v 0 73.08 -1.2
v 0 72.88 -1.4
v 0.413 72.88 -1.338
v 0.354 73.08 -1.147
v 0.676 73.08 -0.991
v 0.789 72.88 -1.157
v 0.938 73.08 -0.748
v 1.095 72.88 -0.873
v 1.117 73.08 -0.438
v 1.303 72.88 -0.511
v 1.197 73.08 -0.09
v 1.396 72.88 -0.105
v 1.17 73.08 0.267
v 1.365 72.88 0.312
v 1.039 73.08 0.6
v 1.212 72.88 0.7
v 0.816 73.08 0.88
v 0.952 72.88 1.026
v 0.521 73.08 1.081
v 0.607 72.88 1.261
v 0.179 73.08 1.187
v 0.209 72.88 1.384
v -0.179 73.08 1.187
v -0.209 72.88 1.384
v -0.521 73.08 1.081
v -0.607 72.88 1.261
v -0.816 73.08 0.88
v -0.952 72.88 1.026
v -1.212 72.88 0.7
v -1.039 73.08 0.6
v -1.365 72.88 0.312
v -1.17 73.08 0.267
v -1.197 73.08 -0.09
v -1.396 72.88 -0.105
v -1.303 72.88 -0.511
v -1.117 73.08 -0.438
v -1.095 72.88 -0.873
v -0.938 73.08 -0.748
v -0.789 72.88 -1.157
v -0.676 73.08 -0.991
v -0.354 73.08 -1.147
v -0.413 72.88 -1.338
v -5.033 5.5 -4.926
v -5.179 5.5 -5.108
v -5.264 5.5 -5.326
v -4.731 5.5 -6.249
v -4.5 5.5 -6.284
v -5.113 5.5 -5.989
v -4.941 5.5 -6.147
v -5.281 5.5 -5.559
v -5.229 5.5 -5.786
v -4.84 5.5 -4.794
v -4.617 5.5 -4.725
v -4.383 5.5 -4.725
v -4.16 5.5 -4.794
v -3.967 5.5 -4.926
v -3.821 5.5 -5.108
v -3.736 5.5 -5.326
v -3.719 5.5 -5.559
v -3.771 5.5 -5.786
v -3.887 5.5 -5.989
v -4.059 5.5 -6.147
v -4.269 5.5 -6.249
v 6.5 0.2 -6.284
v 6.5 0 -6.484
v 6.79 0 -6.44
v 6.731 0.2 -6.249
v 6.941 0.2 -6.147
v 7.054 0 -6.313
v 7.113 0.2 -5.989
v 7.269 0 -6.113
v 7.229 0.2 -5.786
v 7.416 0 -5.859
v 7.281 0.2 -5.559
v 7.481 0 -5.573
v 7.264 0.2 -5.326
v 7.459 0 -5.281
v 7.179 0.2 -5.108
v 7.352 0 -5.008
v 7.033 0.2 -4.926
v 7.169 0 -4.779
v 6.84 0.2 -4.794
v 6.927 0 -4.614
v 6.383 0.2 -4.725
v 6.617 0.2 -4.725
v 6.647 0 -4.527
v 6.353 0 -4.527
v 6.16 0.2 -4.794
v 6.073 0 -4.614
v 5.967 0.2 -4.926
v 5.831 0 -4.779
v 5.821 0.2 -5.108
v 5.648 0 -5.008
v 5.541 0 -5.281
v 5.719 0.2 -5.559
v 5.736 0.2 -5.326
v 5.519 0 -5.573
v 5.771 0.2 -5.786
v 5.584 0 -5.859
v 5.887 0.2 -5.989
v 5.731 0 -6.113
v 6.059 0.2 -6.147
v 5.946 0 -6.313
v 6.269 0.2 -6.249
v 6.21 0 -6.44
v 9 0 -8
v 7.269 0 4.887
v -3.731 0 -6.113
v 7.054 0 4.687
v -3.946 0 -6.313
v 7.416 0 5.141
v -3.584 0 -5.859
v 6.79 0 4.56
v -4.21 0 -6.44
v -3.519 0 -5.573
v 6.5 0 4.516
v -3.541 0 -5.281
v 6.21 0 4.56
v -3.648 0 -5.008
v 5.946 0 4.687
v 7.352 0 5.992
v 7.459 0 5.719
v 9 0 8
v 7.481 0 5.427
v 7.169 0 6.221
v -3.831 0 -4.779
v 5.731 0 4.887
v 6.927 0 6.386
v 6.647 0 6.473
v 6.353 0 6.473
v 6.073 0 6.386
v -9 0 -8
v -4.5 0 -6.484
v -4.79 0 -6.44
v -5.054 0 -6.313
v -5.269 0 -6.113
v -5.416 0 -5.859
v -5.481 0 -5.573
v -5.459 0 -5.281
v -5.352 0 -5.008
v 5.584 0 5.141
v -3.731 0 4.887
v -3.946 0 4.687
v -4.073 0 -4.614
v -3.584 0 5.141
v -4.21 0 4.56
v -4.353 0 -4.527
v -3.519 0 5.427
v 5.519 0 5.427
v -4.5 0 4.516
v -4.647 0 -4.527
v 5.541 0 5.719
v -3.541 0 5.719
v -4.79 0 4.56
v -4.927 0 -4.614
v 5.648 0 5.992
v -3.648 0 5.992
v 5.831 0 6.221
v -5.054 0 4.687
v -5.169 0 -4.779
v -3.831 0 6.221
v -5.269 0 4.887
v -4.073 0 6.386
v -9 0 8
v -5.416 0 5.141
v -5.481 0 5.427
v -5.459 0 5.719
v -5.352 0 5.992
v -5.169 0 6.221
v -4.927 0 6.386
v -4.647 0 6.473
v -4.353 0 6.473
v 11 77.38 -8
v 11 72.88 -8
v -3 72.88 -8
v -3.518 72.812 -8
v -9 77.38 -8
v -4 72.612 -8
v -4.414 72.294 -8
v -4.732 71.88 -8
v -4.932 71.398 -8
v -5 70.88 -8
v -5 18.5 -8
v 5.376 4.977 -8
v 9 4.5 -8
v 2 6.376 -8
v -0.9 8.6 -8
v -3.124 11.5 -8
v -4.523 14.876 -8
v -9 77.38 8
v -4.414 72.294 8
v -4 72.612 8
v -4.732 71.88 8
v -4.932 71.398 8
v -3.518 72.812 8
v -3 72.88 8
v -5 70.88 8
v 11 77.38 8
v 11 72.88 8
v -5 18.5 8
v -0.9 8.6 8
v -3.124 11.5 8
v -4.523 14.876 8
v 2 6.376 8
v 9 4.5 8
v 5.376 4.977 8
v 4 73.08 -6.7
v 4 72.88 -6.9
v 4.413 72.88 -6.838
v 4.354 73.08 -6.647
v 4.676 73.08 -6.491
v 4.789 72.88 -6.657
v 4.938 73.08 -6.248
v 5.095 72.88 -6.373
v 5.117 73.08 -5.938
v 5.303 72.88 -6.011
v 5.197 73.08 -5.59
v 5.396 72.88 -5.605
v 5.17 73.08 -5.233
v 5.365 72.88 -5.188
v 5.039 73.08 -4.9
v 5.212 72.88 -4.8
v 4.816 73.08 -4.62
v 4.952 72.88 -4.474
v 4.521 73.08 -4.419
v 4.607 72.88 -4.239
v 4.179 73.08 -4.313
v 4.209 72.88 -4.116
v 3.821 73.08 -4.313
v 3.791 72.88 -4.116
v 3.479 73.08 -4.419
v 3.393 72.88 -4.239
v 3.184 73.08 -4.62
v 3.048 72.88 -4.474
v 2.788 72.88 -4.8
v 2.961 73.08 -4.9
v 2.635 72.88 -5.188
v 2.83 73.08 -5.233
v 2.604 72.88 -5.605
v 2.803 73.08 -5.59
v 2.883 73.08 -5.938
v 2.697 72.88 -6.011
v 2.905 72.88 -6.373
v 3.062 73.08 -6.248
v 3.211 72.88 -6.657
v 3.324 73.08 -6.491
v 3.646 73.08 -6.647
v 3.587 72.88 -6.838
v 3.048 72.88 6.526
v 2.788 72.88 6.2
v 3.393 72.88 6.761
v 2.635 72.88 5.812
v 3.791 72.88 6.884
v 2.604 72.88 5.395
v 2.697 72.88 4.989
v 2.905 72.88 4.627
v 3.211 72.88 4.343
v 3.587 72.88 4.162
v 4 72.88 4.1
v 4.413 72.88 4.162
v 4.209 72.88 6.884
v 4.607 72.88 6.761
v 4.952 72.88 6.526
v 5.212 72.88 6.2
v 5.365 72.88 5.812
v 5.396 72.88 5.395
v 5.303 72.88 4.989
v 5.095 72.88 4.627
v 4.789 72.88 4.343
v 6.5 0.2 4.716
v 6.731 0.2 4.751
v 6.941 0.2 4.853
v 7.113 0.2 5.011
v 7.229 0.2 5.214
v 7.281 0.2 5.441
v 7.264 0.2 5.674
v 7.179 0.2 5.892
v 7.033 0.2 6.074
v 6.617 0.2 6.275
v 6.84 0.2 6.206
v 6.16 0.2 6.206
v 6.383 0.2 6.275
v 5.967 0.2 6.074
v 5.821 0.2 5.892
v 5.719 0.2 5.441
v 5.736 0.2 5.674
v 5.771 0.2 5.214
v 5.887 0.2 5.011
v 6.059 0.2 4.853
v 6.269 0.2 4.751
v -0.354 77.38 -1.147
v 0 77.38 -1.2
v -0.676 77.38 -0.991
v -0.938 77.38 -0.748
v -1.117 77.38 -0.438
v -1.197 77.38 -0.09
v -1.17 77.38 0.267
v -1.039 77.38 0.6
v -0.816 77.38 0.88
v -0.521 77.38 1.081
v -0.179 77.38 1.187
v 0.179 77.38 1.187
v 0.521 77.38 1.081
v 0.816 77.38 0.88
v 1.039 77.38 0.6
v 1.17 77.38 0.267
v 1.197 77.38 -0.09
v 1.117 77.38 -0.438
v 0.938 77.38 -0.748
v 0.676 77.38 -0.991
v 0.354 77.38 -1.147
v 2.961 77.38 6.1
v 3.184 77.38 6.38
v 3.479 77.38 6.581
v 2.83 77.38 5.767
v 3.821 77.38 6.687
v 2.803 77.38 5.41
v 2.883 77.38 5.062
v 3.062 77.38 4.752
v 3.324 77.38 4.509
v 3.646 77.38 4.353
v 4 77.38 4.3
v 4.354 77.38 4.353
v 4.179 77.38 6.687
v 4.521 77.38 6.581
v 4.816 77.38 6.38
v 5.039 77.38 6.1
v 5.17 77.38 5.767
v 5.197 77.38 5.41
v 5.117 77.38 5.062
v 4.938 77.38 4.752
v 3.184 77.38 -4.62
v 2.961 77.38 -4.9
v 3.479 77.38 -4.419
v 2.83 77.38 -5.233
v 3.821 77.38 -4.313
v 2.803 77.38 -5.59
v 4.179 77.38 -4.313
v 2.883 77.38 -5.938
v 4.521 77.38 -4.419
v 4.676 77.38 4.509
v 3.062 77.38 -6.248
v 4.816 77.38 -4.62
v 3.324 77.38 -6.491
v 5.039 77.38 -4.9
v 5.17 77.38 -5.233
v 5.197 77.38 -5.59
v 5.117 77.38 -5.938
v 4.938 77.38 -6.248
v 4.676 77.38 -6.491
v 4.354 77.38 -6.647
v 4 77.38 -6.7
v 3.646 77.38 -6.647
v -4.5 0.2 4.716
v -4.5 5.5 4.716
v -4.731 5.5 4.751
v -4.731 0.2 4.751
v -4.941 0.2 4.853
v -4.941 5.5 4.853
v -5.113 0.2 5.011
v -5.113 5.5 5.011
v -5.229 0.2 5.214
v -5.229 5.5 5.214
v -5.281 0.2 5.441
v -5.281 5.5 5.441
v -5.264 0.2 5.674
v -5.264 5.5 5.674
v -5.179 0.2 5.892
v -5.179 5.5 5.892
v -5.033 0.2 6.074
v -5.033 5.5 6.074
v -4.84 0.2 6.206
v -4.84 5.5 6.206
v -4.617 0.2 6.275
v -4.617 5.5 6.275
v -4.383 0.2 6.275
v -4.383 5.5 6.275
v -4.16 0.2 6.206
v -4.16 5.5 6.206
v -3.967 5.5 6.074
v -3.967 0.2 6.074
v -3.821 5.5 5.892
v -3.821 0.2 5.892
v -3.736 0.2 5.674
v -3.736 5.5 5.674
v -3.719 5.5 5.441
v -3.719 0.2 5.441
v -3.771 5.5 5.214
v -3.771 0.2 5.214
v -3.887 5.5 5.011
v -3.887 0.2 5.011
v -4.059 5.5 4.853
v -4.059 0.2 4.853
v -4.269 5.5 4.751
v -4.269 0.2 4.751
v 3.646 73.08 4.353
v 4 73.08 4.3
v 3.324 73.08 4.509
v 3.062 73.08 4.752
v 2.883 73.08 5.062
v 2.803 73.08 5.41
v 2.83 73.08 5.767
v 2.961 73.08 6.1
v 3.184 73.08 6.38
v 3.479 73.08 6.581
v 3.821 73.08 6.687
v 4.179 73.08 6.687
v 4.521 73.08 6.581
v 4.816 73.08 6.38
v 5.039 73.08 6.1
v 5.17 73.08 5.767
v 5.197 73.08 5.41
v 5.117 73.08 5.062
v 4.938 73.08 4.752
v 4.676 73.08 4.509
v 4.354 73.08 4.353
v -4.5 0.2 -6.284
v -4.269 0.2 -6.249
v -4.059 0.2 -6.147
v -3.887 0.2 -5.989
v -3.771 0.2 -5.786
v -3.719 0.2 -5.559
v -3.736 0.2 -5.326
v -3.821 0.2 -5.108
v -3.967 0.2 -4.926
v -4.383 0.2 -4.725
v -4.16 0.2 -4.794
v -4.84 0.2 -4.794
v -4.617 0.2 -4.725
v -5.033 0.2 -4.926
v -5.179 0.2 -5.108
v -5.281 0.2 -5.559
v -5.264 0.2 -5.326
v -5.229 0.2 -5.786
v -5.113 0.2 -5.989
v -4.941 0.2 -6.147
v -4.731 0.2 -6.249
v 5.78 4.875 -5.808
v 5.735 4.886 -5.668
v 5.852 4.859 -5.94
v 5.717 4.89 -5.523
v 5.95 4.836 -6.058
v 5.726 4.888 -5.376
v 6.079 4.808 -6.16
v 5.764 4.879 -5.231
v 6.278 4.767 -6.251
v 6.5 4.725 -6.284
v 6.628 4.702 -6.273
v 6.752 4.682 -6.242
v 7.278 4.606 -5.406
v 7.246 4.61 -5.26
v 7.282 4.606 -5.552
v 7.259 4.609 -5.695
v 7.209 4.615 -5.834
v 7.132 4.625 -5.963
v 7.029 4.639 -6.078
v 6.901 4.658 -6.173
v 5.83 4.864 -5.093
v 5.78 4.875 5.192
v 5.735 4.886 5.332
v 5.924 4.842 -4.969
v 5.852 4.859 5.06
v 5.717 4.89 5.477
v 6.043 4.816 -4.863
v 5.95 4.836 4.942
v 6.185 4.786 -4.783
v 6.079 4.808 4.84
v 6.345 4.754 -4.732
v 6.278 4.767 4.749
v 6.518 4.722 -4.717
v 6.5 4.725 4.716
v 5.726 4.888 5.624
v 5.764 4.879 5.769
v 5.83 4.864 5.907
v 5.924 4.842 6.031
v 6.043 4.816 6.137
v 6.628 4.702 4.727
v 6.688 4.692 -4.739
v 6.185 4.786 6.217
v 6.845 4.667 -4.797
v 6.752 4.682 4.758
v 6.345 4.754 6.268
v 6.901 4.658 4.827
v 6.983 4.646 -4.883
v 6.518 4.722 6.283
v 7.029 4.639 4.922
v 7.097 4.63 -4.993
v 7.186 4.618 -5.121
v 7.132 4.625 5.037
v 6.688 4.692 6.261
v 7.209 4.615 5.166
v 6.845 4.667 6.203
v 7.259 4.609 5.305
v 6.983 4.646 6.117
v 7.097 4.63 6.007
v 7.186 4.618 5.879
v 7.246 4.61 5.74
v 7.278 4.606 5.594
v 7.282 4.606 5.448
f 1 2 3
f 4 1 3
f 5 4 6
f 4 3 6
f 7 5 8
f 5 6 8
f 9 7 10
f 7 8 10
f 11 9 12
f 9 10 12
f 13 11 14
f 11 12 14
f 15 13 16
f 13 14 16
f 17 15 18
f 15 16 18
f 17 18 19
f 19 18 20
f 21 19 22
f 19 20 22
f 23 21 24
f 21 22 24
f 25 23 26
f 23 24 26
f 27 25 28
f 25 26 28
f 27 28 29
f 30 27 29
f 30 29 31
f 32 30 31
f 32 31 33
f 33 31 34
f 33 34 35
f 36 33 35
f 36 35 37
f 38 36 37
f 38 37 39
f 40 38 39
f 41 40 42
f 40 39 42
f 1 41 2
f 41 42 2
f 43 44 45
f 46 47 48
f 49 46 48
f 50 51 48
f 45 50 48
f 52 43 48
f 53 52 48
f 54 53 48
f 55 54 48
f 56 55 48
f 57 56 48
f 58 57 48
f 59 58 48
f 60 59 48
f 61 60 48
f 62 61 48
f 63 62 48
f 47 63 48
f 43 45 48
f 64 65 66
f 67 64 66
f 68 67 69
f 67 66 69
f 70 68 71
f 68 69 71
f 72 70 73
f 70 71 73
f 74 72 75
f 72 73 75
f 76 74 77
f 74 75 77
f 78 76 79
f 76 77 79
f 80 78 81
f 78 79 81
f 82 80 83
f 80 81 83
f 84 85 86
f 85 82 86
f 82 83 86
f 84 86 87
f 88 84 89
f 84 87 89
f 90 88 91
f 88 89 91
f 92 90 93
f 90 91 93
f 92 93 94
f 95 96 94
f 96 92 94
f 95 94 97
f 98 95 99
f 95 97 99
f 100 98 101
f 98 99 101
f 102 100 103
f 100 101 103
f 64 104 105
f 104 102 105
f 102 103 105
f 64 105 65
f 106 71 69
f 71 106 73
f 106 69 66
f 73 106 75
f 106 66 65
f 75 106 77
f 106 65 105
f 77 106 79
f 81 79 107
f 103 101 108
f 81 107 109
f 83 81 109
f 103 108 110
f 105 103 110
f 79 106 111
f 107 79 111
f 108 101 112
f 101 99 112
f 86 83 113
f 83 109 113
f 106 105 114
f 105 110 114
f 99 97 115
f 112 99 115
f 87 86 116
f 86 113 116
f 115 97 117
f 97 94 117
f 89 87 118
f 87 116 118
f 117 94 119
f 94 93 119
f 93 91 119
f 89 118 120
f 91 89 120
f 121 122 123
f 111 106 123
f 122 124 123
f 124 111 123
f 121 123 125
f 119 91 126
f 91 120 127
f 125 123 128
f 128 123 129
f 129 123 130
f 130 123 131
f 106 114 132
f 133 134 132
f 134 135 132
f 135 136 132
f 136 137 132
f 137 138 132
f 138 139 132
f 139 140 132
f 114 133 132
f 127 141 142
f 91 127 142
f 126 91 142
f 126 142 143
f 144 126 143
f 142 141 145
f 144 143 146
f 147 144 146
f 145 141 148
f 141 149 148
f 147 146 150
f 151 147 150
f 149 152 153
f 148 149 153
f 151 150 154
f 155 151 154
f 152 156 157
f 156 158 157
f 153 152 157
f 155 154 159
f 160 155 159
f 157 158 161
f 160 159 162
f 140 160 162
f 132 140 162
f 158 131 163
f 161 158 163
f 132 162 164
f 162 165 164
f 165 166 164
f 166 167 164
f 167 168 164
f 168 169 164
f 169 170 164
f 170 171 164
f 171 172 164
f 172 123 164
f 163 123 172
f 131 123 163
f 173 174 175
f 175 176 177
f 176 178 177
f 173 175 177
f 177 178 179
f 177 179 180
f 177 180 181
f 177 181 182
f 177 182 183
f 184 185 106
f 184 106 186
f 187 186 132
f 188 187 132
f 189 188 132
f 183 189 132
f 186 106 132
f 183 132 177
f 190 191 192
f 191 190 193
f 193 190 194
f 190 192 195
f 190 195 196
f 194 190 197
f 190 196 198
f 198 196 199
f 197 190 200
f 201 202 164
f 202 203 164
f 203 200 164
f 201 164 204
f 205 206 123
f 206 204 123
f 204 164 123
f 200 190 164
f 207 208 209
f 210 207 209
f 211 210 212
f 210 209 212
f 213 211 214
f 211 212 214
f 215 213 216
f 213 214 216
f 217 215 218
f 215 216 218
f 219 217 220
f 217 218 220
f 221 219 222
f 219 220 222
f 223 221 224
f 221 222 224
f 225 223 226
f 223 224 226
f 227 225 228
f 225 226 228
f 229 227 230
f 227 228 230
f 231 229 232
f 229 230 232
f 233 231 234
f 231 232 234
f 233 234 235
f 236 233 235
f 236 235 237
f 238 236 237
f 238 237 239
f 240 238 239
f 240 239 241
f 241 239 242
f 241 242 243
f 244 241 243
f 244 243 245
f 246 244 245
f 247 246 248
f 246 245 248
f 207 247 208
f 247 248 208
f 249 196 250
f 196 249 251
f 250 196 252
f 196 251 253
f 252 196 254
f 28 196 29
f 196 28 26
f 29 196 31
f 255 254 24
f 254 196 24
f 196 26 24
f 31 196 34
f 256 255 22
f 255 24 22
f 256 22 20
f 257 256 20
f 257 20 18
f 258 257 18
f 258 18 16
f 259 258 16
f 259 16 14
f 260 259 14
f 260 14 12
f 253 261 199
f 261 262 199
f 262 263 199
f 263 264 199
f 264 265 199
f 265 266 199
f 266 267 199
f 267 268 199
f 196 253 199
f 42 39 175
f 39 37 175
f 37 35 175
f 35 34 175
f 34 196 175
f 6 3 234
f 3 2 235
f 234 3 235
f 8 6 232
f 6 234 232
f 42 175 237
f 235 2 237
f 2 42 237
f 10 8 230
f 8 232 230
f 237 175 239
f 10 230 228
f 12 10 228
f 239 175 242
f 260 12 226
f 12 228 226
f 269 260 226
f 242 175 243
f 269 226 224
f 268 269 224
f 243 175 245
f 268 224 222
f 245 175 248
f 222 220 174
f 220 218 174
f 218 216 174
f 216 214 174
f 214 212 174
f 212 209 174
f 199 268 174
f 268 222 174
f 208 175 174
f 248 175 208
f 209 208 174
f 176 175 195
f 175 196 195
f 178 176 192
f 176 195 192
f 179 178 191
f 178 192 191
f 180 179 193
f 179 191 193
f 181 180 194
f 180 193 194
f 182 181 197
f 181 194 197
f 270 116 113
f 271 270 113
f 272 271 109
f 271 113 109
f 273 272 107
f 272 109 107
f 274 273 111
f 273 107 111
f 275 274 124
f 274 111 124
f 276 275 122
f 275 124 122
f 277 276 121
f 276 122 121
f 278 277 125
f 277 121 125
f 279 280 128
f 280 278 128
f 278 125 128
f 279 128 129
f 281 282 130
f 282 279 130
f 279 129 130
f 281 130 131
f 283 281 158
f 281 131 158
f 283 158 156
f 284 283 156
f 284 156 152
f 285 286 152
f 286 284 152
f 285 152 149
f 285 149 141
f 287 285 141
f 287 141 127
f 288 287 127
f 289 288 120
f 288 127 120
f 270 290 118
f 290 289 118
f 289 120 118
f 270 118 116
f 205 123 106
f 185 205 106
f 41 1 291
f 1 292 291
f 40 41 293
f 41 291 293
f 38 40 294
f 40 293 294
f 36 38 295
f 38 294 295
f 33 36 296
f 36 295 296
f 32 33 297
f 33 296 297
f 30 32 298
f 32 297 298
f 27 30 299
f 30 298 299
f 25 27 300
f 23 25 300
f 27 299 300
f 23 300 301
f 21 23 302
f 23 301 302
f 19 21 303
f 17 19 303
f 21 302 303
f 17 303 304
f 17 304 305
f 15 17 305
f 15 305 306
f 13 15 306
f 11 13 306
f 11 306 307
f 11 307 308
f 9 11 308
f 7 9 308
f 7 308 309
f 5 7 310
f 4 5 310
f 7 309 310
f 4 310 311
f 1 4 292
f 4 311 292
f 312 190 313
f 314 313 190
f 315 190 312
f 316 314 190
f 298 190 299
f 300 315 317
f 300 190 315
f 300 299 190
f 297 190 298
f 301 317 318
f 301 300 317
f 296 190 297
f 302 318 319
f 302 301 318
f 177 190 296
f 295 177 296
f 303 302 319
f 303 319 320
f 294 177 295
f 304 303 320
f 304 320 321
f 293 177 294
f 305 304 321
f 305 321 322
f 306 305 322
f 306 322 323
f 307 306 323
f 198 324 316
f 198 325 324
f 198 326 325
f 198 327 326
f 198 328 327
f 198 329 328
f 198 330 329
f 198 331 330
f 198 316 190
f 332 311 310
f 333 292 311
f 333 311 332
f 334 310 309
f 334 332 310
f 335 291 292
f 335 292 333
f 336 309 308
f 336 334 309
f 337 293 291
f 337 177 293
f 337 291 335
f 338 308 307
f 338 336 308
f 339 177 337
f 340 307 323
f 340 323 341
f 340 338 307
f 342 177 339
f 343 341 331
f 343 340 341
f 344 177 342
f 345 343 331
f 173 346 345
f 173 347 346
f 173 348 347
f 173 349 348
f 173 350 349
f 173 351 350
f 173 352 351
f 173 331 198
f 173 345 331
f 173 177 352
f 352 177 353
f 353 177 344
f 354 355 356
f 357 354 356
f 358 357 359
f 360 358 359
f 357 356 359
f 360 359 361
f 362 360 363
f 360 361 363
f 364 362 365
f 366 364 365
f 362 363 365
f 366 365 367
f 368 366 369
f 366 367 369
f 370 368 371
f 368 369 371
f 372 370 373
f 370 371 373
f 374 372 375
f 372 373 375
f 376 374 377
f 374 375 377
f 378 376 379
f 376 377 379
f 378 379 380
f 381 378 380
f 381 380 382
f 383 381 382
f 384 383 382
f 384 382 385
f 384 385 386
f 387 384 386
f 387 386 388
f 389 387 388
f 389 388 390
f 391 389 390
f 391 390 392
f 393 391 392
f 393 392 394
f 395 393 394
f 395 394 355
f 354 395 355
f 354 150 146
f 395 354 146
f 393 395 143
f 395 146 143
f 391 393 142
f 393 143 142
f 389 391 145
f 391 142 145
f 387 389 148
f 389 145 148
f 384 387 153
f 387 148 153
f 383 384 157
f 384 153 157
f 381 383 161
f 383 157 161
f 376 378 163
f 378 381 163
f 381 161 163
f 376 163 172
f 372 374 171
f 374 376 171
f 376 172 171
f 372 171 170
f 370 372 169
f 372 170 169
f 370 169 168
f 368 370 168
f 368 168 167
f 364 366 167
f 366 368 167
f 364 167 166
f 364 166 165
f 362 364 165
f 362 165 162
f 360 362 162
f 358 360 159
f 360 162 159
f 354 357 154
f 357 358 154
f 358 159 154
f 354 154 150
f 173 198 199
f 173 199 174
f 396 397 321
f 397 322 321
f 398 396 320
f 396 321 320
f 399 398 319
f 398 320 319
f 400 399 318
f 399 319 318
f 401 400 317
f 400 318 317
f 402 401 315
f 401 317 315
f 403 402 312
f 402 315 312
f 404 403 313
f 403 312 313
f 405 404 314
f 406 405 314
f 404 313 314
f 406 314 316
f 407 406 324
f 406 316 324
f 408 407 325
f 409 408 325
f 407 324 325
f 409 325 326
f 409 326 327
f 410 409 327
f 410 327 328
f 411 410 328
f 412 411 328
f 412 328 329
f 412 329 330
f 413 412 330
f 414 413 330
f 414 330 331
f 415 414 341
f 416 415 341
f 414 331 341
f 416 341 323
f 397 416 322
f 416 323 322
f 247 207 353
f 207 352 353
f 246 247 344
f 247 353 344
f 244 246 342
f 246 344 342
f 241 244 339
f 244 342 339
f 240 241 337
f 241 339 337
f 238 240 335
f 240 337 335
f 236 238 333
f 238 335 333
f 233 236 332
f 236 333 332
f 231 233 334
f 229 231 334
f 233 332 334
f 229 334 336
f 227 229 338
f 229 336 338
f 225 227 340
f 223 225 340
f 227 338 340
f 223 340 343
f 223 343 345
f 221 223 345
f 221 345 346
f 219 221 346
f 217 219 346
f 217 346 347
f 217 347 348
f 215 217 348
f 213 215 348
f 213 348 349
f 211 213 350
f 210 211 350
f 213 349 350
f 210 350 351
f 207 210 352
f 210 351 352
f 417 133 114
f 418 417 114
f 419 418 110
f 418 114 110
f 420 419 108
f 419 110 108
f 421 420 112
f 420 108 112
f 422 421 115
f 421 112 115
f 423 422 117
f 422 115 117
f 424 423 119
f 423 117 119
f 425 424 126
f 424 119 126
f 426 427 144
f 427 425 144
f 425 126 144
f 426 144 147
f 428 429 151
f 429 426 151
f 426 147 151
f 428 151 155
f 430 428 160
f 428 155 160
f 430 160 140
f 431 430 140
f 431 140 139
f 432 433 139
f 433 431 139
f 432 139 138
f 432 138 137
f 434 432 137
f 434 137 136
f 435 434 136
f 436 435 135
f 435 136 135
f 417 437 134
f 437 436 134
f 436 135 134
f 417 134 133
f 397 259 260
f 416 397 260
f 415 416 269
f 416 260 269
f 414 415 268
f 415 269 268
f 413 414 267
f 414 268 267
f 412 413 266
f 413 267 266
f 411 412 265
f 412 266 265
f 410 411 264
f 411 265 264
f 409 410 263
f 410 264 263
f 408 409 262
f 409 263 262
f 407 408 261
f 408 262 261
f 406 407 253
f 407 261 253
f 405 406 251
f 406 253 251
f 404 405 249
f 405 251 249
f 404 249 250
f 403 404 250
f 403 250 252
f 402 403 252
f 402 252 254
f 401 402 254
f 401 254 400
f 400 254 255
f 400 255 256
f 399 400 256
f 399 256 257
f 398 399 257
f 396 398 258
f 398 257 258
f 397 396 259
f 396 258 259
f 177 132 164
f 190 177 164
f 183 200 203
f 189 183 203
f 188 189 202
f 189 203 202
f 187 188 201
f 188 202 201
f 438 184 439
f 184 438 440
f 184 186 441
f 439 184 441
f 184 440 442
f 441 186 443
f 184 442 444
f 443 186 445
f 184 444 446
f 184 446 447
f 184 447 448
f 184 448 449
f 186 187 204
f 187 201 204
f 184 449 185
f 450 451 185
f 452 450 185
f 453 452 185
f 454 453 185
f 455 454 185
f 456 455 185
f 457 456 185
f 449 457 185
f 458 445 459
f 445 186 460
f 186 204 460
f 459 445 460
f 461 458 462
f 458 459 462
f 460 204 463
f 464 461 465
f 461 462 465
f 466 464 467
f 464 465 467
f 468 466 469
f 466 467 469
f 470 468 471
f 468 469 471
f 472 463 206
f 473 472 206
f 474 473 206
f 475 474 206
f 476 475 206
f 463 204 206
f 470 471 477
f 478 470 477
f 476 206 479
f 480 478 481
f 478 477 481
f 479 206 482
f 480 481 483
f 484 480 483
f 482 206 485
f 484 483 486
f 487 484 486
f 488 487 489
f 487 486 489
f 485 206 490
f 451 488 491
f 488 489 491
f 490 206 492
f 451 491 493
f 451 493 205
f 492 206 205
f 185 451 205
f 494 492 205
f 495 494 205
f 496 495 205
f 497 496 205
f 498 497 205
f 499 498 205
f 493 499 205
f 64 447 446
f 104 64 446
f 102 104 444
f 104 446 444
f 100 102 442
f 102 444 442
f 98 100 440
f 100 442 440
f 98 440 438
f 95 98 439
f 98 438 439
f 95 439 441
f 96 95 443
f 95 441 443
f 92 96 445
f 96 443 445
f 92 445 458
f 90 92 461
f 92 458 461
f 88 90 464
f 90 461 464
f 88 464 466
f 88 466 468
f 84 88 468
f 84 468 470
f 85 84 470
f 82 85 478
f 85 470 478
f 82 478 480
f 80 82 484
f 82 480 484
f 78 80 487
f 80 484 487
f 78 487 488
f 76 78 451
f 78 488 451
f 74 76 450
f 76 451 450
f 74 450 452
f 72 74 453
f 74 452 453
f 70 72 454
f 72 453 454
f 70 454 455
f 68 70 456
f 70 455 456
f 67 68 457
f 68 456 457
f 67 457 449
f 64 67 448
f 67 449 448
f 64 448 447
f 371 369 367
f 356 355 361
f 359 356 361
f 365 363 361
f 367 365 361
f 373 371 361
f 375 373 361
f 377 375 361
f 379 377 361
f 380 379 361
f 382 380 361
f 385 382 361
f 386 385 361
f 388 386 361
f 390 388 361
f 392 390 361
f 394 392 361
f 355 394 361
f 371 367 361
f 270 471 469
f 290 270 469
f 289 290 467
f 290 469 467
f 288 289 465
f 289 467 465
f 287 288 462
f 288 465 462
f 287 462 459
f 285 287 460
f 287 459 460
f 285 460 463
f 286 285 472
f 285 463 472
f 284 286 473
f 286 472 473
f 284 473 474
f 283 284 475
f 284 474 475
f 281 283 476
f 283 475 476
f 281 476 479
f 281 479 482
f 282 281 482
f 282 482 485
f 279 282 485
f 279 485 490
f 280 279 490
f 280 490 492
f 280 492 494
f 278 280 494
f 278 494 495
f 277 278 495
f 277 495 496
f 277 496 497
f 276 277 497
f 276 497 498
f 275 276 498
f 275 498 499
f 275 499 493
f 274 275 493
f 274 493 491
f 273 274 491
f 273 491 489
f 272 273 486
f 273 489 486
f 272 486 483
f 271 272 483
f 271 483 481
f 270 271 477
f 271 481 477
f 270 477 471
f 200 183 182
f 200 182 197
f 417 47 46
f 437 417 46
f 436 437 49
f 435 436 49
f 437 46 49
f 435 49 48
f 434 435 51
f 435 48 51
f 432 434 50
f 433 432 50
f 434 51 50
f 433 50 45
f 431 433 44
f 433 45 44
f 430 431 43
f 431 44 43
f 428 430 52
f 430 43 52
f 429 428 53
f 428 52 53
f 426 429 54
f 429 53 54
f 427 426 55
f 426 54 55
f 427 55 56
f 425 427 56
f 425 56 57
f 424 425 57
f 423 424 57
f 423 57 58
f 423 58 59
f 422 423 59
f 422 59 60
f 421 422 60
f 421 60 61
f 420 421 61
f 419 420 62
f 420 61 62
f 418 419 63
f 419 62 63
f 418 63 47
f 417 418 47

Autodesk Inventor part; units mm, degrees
ref_plane "YZ Plane" through (0, 0, 0) normal (1, 0, 0) x (0, 1, 0)
ref_plane "XZ Plane" through (0, 0, 0) normal (0, 1, 0) x (-1, 0, 0)
sketch "Sketch1" plane through (0, 0, 0) normal (0, 1, 0) x (-1, 0, 0)
  line L0 (9, 8) -> (-9, 8)
  line L1 (-9, 8) -> (-9, -8)
  line L2 (-9, -8) -> (9, -8)
  line L3 (9, -8) -> (9, 8)
  line L4 (9, 8) -> (-9, -8) construction
  line L5 (-9, 8) -> (9, -8) construction
  point P0 (0, 0)
  dimension "d0" = 18
  dimension "d1" = 16
extrude "Extrusion1" add sketch "Sketch1" along normal blind 4.5
ref_plane "Work Plane1" through (-12, 77.38, -8) normal (0, -1, 0) x (1, 0, 0)
sketch "Sketch6" plane through (0, 4.5, 0) normal (0, 1, 0) x (1, 0, 0)
  line L0 (9, 8) -> (-9, 8) projected
  line L1 (-9, -8) -> (9, -8) projected
  line L2 (-9, 8) -> (-5, 8)
  line L3 (-5, 8) -> (-5, -8)
  line L4 (-5, -8) -> (-9, -8)
  line L5 (-9, -8) -> (-9, 8)
  line L6 (9, -8) -> (9, 8) projected
  point P0 (0, 0)
  dimension "d27" = 14
extrude "WAZNE" add sketch "Sketch6" along normal up to surface (72.88 mm away) contours L3 L1 L5 L0
fillet "Fillet2" radius 14 1 edges at (-5, 4.5, 0)
sketch "Sketch7" plane through (0, 0, 0) normal (0, -1, 0) x (1, 0, 0)
  line L0 (-4.5, 5.5) -> (6.5, 5.5) construction
  line L1 (6.5, 5.5) -> (6.5, -5.5) construction
  line L2 (6.5, -5.5) -> (-4.5, -5.5) construction
  line L3 (-4.5, -5.5) -> (-4.5, 5.5) construction
  line L4 (9, 8) -> (9, -8) projected
  line L5 (-9, 8) -> (9, 8) projected
  point P0 (0, 0)
  dimension "d31" = 11
  dimension "d32" = 11
  dimension "d33" = 2.5
  dimension "d34" = 2.5
hole "Hole2" at (6.5, 0, 5.5) at (-4.5, 0, 5.5) at (-4.5, 0, -5.5) at (6.5, 0, -5.5) direction (0, 1, 0) diameter 1.567 depth 5.5 thread size "M2x0.4" class "6H" standard "ISO Metric profile"
chamfer "Chamfer2" distance 0.2 angle 45 4 edges at (-4.5, 0, 6.2835) (6.5, 0, 6.2835) (6.5, 0, -4.7165) (-4.5, 0, -4.7165)
sketch "Sketch8" plane through (0, 77.38, 0) normal (0, 1, 0) x (1, 0, 0)
  line L0 (-9, 8) -> (-9, -8) projected
  line L1 (11, -8) -> (11, 8)
  line L2 (-9, 8) -> (11, 8)
  line L3 (11, 8) -> (11, -8)
  line L4 (11, -8) -> (-9, -8)
  line L5 (-9, -8) -> (-9, 8)
  point P0 (0, 0)
  point P1 (11, 8)
  dimension "d63" = 20
extrude "Extrusion6" add sketch "Sketch8" against normal blind 4.5
sketch "Sketch9" plane through (0, 72.88, 0) normal (0, -1, 0) x (1, 0, 0)
  line L0 (11, 8) -> (11, -8) projected
  line L1 (-5, -8) -> (-5, 8) projected
  line L2 (4, 7.0265) -> (4, -6.0756) construction
  point P0 (0, 0)
  point P1 (0, 0)
  point P2 (4, 5.5)
  point P3 (4, -5.5)
  dimension "d52" = 5
  dimension "d67" = 7
  dimension "d68" = 4
  dimension "d69" = 11
  dimension "d70" = 5.5
hole "Hole3" at (0, 72.88, 0) at (4, 72.88, 5.5) at (4, 72.88, -5.5) direction (0, 1, 0) diameter 2.4 end through all clearance for "Countersunk Flat Head Screw ISO 2009/7046" size "M2" standard "ISO"
chamfer "Chamfer3" distance 0.2 angle 45 3 edges at (0, 72.88, 1.2) (4, 72.88, 6.7) (4, 72.88, -4.3)
fillet "Fillet4" radius 2 1 edges at (-5, 72.88, 0)
equation "\"d70\" = 0.5 * d69"
properties part number "KN-00-02-09" material "X5CrNi18-10"
